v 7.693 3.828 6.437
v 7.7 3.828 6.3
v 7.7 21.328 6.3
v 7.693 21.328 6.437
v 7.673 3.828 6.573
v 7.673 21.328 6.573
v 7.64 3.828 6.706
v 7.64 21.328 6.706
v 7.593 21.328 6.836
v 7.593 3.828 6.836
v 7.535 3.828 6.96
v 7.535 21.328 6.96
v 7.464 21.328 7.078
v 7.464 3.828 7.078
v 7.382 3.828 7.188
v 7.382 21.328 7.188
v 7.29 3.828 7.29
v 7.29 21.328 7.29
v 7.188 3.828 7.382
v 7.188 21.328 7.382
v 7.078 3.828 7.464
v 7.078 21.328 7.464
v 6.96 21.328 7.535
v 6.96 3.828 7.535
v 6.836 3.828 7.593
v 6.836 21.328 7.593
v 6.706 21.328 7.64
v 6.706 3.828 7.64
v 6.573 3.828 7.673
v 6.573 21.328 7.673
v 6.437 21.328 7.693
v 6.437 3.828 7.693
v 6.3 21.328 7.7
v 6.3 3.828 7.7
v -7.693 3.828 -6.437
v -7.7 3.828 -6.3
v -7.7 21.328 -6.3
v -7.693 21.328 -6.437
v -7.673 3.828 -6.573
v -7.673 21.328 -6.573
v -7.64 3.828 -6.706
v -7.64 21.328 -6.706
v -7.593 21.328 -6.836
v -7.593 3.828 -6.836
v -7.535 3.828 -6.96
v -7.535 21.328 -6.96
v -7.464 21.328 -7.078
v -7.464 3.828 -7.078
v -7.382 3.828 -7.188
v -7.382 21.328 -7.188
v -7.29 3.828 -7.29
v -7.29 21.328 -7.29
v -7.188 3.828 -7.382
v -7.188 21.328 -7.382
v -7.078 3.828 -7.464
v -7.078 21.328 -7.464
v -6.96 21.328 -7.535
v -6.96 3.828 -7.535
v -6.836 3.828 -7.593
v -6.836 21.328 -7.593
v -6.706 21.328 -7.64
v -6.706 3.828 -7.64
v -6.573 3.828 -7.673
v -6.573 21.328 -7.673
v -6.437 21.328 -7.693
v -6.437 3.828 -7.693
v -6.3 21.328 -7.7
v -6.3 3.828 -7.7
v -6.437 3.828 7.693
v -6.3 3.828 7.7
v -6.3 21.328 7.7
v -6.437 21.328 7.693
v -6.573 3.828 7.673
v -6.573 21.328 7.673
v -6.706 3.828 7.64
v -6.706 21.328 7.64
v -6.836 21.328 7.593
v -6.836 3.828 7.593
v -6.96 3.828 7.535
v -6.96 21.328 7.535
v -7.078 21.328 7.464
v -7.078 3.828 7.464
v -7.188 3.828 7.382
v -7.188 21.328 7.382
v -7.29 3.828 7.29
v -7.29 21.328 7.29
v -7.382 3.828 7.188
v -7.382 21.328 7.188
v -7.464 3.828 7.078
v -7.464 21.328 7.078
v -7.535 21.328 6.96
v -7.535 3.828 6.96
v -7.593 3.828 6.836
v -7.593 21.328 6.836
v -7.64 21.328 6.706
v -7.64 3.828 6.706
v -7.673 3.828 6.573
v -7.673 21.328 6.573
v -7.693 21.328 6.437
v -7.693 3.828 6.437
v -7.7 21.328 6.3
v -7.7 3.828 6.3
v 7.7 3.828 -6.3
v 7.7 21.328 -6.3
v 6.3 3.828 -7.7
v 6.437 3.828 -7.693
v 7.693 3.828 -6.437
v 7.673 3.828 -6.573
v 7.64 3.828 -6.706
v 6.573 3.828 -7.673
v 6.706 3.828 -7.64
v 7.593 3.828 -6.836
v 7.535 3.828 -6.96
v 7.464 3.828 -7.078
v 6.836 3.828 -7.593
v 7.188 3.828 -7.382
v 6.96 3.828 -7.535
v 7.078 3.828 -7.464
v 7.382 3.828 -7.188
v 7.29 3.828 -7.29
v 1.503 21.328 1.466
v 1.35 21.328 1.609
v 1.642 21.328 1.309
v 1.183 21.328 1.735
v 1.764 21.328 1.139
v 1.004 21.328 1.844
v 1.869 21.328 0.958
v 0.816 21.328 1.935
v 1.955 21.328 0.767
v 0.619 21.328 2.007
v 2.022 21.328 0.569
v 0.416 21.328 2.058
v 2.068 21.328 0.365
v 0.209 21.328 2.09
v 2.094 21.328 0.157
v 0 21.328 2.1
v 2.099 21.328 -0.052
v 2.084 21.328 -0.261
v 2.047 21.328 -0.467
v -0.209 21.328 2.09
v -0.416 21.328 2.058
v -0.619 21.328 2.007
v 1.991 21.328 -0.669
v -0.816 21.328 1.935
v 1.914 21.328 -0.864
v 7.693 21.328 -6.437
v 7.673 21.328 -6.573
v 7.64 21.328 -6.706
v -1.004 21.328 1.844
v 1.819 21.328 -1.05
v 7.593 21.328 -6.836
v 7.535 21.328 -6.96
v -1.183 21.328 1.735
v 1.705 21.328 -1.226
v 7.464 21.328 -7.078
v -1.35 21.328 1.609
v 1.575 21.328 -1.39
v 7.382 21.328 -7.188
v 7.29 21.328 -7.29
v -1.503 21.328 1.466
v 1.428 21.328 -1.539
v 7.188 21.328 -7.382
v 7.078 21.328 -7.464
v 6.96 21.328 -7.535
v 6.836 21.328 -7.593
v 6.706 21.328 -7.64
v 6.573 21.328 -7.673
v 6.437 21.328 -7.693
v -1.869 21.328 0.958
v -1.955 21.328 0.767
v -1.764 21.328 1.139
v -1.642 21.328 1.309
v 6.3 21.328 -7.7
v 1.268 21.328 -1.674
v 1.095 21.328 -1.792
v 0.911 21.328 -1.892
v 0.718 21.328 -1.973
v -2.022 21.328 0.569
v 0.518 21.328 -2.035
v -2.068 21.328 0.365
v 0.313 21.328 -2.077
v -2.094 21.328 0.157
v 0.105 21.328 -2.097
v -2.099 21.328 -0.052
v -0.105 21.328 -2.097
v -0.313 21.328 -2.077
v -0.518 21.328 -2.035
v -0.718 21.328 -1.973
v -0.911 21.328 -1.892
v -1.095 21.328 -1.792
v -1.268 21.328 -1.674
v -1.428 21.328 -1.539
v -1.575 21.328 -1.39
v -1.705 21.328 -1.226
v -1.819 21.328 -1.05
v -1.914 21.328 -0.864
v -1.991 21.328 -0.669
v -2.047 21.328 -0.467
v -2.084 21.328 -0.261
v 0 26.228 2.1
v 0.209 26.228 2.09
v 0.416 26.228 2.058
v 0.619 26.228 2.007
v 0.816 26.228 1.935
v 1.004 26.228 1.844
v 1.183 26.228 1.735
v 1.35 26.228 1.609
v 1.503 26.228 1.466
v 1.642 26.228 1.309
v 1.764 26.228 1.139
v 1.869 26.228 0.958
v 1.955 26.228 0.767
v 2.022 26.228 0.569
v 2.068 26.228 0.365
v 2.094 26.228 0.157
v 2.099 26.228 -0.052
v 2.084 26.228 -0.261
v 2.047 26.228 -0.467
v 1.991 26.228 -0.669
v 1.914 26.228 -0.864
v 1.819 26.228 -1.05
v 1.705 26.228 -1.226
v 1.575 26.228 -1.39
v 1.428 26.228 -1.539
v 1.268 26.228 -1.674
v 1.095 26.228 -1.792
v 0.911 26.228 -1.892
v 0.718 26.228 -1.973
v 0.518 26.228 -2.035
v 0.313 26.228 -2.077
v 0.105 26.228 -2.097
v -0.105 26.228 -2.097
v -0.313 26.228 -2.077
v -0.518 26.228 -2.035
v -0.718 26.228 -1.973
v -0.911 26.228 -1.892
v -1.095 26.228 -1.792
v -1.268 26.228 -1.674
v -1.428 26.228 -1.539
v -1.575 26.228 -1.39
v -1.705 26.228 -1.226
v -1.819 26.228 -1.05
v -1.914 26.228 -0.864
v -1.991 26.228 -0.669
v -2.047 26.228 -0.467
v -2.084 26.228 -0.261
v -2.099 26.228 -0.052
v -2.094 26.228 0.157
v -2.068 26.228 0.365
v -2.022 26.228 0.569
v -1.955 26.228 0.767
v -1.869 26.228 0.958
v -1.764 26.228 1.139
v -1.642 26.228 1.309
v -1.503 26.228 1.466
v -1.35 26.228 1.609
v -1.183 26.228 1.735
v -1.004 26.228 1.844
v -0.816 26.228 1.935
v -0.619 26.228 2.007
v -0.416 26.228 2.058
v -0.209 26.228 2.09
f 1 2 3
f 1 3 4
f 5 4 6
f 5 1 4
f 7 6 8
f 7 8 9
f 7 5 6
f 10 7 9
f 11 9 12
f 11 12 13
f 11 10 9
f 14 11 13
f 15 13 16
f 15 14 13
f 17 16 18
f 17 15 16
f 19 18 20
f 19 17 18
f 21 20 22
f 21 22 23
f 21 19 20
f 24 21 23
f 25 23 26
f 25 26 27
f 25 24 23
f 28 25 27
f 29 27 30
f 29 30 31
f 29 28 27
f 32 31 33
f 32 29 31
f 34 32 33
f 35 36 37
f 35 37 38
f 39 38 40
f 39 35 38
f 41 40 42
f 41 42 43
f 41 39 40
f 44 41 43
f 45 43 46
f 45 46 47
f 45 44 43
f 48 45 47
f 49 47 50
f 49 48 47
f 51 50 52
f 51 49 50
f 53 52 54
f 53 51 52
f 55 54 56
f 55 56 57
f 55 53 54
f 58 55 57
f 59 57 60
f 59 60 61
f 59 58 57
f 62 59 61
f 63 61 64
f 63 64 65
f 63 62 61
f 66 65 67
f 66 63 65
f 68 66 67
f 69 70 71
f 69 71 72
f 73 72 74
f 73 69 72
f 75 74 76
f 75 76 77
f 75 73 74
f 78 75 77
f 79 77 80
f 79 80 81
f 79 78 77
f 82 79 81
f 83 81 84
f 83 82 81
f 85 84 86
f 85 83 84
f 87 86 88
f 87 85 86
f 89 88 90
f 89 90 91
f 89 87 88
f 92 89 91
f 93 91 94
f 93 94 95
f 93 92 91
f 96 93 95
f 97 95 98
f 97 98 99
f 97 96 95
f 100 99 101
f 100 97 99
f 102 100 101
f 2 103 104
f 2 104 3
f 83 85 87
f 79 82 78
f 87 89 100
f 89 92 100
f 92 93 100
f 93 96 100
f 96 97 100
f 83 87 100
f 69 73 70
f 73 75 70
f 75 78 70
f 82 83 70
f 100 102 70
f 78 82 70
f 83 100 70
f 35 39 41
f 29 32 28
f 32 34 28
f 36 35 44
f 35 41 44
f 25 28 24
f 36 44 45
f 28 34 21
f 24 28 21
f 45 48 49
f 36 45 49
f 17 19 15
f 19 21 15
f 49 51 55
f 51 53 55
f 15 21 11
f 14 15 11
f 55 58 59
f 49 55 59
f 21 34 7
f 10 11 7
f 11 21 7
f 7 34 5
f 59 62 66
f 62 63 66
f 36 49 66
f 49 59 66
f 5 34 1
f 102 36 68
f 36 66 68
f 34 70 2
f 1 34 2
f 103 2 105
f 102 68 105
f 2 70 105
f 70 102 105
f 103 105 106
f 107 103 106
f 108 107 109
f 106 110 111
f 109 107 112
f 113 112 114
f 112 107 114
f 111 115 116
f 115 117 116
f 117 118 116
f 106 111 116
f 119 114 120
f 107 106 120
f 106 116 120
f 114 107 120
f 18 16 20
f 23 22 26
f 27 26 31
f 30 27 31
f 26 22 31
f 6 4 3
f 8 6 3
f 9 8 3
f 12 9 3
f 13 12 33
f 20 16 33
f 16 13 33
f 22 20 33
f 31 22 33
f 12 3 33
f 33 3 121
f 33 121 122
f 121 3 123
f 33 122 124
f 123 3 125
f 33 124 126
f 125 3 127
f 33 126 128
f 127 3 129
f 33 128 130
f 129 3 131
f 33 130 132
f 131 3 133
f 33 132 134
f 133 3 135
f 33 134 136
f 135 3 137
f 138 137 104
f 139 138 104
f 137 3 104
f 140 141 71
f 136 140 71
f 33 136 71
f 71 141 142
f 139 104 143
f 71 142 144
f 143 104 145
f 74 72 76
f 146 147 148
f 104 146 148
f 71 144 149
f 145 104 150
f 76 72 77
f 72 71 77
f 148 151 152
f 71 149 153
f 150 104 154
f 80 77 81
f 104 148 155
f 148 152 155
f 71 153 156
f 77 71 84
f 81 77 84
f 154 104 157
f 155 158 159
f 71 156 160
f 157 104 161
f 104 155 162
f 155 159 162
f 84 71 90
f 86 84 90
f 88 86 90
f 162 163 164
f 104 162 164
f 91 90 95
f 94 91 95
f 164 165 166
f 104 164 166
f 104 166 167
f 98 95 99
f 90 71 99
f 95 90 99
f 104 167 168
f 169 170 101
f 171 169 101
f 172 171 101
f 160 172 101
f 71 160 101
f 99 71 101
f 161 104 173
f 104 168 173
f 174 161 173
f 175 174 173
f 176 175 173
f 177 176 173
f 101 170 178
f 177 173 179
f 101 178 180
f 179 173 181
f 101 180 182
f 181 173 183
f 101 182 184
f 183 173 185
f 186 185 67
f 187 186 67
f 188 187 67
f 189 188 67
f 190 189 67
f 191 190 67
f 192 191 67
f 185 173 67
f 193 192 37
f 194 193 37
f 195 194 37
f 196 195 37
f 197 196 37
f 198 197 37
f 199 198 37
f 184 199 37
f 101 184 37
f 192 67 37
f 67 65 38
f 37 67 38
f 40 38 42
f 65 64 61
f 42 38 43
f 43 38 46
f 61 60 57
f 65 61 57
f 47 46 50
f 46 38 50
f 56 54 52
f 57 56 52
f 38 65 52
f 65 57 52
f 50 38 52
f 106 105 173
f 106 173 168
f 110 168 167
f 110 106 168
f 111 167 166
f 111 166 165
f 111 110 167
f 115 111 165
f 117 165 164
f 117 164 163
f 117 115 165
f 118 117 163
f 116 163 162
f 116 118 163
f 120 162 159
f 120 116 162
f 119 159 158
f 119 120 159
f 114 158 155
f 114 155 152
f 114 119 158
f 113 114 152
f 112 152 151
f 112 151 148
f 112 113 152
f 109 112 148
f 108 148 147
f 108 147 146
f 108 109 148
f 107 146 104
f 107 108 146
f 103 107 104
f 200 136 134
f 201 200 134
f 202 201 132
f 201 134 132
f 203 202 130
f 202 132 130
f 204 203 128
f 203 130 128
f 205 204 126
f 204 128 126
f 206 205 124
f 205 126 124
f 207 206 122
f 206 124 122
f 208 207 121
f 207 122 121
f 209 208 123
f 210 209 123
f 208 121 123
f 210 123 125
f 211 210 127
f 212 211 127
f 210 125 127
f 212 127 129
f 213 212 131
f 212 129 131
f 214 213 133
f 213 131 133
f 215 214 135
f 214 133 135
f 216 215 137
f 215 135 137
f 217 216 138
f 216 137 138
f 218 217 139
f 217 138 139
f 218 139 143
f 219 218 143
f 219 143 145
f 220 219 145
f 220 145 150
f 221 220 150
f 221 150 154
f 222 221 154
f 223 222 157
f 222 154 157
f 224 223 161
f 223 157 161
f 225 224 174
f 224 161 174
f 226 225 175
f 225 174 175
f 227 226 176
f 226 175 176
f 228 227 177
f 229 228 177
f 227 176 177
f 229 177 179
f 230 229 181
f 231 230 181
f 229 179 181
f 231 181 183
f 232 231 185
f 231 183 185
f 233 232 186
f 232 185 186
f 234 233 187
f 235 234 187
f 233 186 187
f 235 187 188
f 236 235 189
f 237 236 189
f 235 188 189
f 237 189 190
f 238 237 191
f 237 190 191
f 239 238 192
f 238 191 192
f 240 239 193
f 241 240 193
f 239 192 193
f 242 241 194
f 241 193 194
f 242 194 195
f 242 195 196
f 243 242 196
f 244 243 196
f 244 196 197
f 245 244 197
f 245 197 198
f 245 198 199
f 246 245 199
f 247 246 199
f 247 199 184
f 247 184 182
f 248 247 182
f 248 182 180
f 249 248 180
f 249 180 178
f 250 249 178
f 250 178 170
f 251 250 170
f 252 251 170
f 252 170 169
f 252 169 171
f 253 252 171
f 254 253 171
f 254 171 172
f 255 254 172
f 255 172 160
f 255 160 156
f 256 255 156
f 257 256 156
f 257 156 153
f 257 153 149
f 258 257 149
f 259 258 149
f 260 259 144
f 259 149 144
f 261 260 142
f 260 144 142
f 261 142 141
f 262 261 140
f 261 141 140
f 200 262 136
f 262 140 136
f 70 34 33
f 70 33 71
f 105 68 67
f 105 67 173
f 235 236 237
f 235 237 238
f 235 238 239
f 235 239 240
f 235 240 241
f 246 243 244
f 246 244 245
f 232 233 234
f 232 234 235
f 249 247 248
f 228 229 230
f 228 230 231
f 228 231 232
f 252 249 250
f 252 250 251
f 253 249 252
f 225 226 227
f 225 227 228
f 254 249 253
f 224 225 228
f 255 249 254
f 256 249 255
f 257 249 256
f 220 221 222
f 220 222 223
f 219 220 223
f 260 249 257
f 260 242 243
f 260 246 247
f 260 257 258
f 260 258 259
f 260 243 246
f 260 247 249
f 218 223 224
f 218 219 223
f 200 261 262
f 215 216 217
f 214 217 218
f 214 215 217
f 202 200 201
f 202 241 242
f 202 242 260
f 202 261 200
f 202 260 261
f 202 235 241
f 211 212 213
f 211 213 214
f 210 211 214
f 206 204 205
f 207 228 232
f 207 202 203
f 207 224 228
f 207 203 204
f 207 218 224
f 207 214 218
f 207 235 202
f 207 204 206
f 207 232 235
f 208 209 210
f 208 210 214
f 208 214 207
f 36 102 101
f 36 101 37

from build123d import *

# Parameters (mm, degrees)
SKETCH1_R           = 6
BOSS_EXTRUDE1_DEPTH = 25
SKETCH2_R           = 3
BOSS_EXTRUDE2_DEPTH = 7
SCALE1_SCALE        = 0.7


with BuildPart() as part:
    # Sketch1 → Boss-Extrude1 (new body)
    # profile 1 of 2: a face of its own
    with BuildSketch(Plane(origin=(0, 0, 0), x_dir=(1, 0, 0), z_dir=(0, 1, 0))):
        with BuildLine():
            ThreePointArc((-11, 9), (-10.414213562, 10.414213562), (-9, 11))
            Line((-9, 11), (9, 11))
            ThreePointArc((9, 11), (10.414213562, 10.414213562), (11, 9))
            Line((11, 9), (11, -9))
            ThreePointArc((11, -9), (10.414213562, -10.414213562), (9, -11))
            Line((9, -11), (-9, -11))
            ThreePointArc((-9, -11), (-10.414213562, -10.414213562), (-11, -9))
            Line((-11, -9), (-11, 9))
        make_face()
        Circle(SKETCH1_R, mode=Mode.SUBTRACT)
    # profile 2 of 2: a face of its own
    with BuildSketch(Plane(origin=(0, 0, 0), x_dir=(1, 0, 0), z_dir=(0, 1, 0))):
        Circle(SKETCH1_R)
    extrude(amount=BOSS_EXTRUDE1_DEPTH)

    # Sketch2 → Boss-Extrude2 (add)
    with BuildSketch(Plane(origin=(0, 25, 0), x_dir=(1, 0, 0), z_dir=(0, 1, 0))):
        with Locations(Location((0, 0, 0), (0, 0, 270))):
            Circle(SKETCH2_R)
    extrude(amount=BOSS_EXTRUDE2_DEPTH)


with BuildPart() as part_1:
    # Scale1: scaled about (0, 12.759310903, 0)
    add(part.part.scale(SCALE1_SCALE).moved(Location((0, 3.827793271, 0))))


solid = part_1.part
